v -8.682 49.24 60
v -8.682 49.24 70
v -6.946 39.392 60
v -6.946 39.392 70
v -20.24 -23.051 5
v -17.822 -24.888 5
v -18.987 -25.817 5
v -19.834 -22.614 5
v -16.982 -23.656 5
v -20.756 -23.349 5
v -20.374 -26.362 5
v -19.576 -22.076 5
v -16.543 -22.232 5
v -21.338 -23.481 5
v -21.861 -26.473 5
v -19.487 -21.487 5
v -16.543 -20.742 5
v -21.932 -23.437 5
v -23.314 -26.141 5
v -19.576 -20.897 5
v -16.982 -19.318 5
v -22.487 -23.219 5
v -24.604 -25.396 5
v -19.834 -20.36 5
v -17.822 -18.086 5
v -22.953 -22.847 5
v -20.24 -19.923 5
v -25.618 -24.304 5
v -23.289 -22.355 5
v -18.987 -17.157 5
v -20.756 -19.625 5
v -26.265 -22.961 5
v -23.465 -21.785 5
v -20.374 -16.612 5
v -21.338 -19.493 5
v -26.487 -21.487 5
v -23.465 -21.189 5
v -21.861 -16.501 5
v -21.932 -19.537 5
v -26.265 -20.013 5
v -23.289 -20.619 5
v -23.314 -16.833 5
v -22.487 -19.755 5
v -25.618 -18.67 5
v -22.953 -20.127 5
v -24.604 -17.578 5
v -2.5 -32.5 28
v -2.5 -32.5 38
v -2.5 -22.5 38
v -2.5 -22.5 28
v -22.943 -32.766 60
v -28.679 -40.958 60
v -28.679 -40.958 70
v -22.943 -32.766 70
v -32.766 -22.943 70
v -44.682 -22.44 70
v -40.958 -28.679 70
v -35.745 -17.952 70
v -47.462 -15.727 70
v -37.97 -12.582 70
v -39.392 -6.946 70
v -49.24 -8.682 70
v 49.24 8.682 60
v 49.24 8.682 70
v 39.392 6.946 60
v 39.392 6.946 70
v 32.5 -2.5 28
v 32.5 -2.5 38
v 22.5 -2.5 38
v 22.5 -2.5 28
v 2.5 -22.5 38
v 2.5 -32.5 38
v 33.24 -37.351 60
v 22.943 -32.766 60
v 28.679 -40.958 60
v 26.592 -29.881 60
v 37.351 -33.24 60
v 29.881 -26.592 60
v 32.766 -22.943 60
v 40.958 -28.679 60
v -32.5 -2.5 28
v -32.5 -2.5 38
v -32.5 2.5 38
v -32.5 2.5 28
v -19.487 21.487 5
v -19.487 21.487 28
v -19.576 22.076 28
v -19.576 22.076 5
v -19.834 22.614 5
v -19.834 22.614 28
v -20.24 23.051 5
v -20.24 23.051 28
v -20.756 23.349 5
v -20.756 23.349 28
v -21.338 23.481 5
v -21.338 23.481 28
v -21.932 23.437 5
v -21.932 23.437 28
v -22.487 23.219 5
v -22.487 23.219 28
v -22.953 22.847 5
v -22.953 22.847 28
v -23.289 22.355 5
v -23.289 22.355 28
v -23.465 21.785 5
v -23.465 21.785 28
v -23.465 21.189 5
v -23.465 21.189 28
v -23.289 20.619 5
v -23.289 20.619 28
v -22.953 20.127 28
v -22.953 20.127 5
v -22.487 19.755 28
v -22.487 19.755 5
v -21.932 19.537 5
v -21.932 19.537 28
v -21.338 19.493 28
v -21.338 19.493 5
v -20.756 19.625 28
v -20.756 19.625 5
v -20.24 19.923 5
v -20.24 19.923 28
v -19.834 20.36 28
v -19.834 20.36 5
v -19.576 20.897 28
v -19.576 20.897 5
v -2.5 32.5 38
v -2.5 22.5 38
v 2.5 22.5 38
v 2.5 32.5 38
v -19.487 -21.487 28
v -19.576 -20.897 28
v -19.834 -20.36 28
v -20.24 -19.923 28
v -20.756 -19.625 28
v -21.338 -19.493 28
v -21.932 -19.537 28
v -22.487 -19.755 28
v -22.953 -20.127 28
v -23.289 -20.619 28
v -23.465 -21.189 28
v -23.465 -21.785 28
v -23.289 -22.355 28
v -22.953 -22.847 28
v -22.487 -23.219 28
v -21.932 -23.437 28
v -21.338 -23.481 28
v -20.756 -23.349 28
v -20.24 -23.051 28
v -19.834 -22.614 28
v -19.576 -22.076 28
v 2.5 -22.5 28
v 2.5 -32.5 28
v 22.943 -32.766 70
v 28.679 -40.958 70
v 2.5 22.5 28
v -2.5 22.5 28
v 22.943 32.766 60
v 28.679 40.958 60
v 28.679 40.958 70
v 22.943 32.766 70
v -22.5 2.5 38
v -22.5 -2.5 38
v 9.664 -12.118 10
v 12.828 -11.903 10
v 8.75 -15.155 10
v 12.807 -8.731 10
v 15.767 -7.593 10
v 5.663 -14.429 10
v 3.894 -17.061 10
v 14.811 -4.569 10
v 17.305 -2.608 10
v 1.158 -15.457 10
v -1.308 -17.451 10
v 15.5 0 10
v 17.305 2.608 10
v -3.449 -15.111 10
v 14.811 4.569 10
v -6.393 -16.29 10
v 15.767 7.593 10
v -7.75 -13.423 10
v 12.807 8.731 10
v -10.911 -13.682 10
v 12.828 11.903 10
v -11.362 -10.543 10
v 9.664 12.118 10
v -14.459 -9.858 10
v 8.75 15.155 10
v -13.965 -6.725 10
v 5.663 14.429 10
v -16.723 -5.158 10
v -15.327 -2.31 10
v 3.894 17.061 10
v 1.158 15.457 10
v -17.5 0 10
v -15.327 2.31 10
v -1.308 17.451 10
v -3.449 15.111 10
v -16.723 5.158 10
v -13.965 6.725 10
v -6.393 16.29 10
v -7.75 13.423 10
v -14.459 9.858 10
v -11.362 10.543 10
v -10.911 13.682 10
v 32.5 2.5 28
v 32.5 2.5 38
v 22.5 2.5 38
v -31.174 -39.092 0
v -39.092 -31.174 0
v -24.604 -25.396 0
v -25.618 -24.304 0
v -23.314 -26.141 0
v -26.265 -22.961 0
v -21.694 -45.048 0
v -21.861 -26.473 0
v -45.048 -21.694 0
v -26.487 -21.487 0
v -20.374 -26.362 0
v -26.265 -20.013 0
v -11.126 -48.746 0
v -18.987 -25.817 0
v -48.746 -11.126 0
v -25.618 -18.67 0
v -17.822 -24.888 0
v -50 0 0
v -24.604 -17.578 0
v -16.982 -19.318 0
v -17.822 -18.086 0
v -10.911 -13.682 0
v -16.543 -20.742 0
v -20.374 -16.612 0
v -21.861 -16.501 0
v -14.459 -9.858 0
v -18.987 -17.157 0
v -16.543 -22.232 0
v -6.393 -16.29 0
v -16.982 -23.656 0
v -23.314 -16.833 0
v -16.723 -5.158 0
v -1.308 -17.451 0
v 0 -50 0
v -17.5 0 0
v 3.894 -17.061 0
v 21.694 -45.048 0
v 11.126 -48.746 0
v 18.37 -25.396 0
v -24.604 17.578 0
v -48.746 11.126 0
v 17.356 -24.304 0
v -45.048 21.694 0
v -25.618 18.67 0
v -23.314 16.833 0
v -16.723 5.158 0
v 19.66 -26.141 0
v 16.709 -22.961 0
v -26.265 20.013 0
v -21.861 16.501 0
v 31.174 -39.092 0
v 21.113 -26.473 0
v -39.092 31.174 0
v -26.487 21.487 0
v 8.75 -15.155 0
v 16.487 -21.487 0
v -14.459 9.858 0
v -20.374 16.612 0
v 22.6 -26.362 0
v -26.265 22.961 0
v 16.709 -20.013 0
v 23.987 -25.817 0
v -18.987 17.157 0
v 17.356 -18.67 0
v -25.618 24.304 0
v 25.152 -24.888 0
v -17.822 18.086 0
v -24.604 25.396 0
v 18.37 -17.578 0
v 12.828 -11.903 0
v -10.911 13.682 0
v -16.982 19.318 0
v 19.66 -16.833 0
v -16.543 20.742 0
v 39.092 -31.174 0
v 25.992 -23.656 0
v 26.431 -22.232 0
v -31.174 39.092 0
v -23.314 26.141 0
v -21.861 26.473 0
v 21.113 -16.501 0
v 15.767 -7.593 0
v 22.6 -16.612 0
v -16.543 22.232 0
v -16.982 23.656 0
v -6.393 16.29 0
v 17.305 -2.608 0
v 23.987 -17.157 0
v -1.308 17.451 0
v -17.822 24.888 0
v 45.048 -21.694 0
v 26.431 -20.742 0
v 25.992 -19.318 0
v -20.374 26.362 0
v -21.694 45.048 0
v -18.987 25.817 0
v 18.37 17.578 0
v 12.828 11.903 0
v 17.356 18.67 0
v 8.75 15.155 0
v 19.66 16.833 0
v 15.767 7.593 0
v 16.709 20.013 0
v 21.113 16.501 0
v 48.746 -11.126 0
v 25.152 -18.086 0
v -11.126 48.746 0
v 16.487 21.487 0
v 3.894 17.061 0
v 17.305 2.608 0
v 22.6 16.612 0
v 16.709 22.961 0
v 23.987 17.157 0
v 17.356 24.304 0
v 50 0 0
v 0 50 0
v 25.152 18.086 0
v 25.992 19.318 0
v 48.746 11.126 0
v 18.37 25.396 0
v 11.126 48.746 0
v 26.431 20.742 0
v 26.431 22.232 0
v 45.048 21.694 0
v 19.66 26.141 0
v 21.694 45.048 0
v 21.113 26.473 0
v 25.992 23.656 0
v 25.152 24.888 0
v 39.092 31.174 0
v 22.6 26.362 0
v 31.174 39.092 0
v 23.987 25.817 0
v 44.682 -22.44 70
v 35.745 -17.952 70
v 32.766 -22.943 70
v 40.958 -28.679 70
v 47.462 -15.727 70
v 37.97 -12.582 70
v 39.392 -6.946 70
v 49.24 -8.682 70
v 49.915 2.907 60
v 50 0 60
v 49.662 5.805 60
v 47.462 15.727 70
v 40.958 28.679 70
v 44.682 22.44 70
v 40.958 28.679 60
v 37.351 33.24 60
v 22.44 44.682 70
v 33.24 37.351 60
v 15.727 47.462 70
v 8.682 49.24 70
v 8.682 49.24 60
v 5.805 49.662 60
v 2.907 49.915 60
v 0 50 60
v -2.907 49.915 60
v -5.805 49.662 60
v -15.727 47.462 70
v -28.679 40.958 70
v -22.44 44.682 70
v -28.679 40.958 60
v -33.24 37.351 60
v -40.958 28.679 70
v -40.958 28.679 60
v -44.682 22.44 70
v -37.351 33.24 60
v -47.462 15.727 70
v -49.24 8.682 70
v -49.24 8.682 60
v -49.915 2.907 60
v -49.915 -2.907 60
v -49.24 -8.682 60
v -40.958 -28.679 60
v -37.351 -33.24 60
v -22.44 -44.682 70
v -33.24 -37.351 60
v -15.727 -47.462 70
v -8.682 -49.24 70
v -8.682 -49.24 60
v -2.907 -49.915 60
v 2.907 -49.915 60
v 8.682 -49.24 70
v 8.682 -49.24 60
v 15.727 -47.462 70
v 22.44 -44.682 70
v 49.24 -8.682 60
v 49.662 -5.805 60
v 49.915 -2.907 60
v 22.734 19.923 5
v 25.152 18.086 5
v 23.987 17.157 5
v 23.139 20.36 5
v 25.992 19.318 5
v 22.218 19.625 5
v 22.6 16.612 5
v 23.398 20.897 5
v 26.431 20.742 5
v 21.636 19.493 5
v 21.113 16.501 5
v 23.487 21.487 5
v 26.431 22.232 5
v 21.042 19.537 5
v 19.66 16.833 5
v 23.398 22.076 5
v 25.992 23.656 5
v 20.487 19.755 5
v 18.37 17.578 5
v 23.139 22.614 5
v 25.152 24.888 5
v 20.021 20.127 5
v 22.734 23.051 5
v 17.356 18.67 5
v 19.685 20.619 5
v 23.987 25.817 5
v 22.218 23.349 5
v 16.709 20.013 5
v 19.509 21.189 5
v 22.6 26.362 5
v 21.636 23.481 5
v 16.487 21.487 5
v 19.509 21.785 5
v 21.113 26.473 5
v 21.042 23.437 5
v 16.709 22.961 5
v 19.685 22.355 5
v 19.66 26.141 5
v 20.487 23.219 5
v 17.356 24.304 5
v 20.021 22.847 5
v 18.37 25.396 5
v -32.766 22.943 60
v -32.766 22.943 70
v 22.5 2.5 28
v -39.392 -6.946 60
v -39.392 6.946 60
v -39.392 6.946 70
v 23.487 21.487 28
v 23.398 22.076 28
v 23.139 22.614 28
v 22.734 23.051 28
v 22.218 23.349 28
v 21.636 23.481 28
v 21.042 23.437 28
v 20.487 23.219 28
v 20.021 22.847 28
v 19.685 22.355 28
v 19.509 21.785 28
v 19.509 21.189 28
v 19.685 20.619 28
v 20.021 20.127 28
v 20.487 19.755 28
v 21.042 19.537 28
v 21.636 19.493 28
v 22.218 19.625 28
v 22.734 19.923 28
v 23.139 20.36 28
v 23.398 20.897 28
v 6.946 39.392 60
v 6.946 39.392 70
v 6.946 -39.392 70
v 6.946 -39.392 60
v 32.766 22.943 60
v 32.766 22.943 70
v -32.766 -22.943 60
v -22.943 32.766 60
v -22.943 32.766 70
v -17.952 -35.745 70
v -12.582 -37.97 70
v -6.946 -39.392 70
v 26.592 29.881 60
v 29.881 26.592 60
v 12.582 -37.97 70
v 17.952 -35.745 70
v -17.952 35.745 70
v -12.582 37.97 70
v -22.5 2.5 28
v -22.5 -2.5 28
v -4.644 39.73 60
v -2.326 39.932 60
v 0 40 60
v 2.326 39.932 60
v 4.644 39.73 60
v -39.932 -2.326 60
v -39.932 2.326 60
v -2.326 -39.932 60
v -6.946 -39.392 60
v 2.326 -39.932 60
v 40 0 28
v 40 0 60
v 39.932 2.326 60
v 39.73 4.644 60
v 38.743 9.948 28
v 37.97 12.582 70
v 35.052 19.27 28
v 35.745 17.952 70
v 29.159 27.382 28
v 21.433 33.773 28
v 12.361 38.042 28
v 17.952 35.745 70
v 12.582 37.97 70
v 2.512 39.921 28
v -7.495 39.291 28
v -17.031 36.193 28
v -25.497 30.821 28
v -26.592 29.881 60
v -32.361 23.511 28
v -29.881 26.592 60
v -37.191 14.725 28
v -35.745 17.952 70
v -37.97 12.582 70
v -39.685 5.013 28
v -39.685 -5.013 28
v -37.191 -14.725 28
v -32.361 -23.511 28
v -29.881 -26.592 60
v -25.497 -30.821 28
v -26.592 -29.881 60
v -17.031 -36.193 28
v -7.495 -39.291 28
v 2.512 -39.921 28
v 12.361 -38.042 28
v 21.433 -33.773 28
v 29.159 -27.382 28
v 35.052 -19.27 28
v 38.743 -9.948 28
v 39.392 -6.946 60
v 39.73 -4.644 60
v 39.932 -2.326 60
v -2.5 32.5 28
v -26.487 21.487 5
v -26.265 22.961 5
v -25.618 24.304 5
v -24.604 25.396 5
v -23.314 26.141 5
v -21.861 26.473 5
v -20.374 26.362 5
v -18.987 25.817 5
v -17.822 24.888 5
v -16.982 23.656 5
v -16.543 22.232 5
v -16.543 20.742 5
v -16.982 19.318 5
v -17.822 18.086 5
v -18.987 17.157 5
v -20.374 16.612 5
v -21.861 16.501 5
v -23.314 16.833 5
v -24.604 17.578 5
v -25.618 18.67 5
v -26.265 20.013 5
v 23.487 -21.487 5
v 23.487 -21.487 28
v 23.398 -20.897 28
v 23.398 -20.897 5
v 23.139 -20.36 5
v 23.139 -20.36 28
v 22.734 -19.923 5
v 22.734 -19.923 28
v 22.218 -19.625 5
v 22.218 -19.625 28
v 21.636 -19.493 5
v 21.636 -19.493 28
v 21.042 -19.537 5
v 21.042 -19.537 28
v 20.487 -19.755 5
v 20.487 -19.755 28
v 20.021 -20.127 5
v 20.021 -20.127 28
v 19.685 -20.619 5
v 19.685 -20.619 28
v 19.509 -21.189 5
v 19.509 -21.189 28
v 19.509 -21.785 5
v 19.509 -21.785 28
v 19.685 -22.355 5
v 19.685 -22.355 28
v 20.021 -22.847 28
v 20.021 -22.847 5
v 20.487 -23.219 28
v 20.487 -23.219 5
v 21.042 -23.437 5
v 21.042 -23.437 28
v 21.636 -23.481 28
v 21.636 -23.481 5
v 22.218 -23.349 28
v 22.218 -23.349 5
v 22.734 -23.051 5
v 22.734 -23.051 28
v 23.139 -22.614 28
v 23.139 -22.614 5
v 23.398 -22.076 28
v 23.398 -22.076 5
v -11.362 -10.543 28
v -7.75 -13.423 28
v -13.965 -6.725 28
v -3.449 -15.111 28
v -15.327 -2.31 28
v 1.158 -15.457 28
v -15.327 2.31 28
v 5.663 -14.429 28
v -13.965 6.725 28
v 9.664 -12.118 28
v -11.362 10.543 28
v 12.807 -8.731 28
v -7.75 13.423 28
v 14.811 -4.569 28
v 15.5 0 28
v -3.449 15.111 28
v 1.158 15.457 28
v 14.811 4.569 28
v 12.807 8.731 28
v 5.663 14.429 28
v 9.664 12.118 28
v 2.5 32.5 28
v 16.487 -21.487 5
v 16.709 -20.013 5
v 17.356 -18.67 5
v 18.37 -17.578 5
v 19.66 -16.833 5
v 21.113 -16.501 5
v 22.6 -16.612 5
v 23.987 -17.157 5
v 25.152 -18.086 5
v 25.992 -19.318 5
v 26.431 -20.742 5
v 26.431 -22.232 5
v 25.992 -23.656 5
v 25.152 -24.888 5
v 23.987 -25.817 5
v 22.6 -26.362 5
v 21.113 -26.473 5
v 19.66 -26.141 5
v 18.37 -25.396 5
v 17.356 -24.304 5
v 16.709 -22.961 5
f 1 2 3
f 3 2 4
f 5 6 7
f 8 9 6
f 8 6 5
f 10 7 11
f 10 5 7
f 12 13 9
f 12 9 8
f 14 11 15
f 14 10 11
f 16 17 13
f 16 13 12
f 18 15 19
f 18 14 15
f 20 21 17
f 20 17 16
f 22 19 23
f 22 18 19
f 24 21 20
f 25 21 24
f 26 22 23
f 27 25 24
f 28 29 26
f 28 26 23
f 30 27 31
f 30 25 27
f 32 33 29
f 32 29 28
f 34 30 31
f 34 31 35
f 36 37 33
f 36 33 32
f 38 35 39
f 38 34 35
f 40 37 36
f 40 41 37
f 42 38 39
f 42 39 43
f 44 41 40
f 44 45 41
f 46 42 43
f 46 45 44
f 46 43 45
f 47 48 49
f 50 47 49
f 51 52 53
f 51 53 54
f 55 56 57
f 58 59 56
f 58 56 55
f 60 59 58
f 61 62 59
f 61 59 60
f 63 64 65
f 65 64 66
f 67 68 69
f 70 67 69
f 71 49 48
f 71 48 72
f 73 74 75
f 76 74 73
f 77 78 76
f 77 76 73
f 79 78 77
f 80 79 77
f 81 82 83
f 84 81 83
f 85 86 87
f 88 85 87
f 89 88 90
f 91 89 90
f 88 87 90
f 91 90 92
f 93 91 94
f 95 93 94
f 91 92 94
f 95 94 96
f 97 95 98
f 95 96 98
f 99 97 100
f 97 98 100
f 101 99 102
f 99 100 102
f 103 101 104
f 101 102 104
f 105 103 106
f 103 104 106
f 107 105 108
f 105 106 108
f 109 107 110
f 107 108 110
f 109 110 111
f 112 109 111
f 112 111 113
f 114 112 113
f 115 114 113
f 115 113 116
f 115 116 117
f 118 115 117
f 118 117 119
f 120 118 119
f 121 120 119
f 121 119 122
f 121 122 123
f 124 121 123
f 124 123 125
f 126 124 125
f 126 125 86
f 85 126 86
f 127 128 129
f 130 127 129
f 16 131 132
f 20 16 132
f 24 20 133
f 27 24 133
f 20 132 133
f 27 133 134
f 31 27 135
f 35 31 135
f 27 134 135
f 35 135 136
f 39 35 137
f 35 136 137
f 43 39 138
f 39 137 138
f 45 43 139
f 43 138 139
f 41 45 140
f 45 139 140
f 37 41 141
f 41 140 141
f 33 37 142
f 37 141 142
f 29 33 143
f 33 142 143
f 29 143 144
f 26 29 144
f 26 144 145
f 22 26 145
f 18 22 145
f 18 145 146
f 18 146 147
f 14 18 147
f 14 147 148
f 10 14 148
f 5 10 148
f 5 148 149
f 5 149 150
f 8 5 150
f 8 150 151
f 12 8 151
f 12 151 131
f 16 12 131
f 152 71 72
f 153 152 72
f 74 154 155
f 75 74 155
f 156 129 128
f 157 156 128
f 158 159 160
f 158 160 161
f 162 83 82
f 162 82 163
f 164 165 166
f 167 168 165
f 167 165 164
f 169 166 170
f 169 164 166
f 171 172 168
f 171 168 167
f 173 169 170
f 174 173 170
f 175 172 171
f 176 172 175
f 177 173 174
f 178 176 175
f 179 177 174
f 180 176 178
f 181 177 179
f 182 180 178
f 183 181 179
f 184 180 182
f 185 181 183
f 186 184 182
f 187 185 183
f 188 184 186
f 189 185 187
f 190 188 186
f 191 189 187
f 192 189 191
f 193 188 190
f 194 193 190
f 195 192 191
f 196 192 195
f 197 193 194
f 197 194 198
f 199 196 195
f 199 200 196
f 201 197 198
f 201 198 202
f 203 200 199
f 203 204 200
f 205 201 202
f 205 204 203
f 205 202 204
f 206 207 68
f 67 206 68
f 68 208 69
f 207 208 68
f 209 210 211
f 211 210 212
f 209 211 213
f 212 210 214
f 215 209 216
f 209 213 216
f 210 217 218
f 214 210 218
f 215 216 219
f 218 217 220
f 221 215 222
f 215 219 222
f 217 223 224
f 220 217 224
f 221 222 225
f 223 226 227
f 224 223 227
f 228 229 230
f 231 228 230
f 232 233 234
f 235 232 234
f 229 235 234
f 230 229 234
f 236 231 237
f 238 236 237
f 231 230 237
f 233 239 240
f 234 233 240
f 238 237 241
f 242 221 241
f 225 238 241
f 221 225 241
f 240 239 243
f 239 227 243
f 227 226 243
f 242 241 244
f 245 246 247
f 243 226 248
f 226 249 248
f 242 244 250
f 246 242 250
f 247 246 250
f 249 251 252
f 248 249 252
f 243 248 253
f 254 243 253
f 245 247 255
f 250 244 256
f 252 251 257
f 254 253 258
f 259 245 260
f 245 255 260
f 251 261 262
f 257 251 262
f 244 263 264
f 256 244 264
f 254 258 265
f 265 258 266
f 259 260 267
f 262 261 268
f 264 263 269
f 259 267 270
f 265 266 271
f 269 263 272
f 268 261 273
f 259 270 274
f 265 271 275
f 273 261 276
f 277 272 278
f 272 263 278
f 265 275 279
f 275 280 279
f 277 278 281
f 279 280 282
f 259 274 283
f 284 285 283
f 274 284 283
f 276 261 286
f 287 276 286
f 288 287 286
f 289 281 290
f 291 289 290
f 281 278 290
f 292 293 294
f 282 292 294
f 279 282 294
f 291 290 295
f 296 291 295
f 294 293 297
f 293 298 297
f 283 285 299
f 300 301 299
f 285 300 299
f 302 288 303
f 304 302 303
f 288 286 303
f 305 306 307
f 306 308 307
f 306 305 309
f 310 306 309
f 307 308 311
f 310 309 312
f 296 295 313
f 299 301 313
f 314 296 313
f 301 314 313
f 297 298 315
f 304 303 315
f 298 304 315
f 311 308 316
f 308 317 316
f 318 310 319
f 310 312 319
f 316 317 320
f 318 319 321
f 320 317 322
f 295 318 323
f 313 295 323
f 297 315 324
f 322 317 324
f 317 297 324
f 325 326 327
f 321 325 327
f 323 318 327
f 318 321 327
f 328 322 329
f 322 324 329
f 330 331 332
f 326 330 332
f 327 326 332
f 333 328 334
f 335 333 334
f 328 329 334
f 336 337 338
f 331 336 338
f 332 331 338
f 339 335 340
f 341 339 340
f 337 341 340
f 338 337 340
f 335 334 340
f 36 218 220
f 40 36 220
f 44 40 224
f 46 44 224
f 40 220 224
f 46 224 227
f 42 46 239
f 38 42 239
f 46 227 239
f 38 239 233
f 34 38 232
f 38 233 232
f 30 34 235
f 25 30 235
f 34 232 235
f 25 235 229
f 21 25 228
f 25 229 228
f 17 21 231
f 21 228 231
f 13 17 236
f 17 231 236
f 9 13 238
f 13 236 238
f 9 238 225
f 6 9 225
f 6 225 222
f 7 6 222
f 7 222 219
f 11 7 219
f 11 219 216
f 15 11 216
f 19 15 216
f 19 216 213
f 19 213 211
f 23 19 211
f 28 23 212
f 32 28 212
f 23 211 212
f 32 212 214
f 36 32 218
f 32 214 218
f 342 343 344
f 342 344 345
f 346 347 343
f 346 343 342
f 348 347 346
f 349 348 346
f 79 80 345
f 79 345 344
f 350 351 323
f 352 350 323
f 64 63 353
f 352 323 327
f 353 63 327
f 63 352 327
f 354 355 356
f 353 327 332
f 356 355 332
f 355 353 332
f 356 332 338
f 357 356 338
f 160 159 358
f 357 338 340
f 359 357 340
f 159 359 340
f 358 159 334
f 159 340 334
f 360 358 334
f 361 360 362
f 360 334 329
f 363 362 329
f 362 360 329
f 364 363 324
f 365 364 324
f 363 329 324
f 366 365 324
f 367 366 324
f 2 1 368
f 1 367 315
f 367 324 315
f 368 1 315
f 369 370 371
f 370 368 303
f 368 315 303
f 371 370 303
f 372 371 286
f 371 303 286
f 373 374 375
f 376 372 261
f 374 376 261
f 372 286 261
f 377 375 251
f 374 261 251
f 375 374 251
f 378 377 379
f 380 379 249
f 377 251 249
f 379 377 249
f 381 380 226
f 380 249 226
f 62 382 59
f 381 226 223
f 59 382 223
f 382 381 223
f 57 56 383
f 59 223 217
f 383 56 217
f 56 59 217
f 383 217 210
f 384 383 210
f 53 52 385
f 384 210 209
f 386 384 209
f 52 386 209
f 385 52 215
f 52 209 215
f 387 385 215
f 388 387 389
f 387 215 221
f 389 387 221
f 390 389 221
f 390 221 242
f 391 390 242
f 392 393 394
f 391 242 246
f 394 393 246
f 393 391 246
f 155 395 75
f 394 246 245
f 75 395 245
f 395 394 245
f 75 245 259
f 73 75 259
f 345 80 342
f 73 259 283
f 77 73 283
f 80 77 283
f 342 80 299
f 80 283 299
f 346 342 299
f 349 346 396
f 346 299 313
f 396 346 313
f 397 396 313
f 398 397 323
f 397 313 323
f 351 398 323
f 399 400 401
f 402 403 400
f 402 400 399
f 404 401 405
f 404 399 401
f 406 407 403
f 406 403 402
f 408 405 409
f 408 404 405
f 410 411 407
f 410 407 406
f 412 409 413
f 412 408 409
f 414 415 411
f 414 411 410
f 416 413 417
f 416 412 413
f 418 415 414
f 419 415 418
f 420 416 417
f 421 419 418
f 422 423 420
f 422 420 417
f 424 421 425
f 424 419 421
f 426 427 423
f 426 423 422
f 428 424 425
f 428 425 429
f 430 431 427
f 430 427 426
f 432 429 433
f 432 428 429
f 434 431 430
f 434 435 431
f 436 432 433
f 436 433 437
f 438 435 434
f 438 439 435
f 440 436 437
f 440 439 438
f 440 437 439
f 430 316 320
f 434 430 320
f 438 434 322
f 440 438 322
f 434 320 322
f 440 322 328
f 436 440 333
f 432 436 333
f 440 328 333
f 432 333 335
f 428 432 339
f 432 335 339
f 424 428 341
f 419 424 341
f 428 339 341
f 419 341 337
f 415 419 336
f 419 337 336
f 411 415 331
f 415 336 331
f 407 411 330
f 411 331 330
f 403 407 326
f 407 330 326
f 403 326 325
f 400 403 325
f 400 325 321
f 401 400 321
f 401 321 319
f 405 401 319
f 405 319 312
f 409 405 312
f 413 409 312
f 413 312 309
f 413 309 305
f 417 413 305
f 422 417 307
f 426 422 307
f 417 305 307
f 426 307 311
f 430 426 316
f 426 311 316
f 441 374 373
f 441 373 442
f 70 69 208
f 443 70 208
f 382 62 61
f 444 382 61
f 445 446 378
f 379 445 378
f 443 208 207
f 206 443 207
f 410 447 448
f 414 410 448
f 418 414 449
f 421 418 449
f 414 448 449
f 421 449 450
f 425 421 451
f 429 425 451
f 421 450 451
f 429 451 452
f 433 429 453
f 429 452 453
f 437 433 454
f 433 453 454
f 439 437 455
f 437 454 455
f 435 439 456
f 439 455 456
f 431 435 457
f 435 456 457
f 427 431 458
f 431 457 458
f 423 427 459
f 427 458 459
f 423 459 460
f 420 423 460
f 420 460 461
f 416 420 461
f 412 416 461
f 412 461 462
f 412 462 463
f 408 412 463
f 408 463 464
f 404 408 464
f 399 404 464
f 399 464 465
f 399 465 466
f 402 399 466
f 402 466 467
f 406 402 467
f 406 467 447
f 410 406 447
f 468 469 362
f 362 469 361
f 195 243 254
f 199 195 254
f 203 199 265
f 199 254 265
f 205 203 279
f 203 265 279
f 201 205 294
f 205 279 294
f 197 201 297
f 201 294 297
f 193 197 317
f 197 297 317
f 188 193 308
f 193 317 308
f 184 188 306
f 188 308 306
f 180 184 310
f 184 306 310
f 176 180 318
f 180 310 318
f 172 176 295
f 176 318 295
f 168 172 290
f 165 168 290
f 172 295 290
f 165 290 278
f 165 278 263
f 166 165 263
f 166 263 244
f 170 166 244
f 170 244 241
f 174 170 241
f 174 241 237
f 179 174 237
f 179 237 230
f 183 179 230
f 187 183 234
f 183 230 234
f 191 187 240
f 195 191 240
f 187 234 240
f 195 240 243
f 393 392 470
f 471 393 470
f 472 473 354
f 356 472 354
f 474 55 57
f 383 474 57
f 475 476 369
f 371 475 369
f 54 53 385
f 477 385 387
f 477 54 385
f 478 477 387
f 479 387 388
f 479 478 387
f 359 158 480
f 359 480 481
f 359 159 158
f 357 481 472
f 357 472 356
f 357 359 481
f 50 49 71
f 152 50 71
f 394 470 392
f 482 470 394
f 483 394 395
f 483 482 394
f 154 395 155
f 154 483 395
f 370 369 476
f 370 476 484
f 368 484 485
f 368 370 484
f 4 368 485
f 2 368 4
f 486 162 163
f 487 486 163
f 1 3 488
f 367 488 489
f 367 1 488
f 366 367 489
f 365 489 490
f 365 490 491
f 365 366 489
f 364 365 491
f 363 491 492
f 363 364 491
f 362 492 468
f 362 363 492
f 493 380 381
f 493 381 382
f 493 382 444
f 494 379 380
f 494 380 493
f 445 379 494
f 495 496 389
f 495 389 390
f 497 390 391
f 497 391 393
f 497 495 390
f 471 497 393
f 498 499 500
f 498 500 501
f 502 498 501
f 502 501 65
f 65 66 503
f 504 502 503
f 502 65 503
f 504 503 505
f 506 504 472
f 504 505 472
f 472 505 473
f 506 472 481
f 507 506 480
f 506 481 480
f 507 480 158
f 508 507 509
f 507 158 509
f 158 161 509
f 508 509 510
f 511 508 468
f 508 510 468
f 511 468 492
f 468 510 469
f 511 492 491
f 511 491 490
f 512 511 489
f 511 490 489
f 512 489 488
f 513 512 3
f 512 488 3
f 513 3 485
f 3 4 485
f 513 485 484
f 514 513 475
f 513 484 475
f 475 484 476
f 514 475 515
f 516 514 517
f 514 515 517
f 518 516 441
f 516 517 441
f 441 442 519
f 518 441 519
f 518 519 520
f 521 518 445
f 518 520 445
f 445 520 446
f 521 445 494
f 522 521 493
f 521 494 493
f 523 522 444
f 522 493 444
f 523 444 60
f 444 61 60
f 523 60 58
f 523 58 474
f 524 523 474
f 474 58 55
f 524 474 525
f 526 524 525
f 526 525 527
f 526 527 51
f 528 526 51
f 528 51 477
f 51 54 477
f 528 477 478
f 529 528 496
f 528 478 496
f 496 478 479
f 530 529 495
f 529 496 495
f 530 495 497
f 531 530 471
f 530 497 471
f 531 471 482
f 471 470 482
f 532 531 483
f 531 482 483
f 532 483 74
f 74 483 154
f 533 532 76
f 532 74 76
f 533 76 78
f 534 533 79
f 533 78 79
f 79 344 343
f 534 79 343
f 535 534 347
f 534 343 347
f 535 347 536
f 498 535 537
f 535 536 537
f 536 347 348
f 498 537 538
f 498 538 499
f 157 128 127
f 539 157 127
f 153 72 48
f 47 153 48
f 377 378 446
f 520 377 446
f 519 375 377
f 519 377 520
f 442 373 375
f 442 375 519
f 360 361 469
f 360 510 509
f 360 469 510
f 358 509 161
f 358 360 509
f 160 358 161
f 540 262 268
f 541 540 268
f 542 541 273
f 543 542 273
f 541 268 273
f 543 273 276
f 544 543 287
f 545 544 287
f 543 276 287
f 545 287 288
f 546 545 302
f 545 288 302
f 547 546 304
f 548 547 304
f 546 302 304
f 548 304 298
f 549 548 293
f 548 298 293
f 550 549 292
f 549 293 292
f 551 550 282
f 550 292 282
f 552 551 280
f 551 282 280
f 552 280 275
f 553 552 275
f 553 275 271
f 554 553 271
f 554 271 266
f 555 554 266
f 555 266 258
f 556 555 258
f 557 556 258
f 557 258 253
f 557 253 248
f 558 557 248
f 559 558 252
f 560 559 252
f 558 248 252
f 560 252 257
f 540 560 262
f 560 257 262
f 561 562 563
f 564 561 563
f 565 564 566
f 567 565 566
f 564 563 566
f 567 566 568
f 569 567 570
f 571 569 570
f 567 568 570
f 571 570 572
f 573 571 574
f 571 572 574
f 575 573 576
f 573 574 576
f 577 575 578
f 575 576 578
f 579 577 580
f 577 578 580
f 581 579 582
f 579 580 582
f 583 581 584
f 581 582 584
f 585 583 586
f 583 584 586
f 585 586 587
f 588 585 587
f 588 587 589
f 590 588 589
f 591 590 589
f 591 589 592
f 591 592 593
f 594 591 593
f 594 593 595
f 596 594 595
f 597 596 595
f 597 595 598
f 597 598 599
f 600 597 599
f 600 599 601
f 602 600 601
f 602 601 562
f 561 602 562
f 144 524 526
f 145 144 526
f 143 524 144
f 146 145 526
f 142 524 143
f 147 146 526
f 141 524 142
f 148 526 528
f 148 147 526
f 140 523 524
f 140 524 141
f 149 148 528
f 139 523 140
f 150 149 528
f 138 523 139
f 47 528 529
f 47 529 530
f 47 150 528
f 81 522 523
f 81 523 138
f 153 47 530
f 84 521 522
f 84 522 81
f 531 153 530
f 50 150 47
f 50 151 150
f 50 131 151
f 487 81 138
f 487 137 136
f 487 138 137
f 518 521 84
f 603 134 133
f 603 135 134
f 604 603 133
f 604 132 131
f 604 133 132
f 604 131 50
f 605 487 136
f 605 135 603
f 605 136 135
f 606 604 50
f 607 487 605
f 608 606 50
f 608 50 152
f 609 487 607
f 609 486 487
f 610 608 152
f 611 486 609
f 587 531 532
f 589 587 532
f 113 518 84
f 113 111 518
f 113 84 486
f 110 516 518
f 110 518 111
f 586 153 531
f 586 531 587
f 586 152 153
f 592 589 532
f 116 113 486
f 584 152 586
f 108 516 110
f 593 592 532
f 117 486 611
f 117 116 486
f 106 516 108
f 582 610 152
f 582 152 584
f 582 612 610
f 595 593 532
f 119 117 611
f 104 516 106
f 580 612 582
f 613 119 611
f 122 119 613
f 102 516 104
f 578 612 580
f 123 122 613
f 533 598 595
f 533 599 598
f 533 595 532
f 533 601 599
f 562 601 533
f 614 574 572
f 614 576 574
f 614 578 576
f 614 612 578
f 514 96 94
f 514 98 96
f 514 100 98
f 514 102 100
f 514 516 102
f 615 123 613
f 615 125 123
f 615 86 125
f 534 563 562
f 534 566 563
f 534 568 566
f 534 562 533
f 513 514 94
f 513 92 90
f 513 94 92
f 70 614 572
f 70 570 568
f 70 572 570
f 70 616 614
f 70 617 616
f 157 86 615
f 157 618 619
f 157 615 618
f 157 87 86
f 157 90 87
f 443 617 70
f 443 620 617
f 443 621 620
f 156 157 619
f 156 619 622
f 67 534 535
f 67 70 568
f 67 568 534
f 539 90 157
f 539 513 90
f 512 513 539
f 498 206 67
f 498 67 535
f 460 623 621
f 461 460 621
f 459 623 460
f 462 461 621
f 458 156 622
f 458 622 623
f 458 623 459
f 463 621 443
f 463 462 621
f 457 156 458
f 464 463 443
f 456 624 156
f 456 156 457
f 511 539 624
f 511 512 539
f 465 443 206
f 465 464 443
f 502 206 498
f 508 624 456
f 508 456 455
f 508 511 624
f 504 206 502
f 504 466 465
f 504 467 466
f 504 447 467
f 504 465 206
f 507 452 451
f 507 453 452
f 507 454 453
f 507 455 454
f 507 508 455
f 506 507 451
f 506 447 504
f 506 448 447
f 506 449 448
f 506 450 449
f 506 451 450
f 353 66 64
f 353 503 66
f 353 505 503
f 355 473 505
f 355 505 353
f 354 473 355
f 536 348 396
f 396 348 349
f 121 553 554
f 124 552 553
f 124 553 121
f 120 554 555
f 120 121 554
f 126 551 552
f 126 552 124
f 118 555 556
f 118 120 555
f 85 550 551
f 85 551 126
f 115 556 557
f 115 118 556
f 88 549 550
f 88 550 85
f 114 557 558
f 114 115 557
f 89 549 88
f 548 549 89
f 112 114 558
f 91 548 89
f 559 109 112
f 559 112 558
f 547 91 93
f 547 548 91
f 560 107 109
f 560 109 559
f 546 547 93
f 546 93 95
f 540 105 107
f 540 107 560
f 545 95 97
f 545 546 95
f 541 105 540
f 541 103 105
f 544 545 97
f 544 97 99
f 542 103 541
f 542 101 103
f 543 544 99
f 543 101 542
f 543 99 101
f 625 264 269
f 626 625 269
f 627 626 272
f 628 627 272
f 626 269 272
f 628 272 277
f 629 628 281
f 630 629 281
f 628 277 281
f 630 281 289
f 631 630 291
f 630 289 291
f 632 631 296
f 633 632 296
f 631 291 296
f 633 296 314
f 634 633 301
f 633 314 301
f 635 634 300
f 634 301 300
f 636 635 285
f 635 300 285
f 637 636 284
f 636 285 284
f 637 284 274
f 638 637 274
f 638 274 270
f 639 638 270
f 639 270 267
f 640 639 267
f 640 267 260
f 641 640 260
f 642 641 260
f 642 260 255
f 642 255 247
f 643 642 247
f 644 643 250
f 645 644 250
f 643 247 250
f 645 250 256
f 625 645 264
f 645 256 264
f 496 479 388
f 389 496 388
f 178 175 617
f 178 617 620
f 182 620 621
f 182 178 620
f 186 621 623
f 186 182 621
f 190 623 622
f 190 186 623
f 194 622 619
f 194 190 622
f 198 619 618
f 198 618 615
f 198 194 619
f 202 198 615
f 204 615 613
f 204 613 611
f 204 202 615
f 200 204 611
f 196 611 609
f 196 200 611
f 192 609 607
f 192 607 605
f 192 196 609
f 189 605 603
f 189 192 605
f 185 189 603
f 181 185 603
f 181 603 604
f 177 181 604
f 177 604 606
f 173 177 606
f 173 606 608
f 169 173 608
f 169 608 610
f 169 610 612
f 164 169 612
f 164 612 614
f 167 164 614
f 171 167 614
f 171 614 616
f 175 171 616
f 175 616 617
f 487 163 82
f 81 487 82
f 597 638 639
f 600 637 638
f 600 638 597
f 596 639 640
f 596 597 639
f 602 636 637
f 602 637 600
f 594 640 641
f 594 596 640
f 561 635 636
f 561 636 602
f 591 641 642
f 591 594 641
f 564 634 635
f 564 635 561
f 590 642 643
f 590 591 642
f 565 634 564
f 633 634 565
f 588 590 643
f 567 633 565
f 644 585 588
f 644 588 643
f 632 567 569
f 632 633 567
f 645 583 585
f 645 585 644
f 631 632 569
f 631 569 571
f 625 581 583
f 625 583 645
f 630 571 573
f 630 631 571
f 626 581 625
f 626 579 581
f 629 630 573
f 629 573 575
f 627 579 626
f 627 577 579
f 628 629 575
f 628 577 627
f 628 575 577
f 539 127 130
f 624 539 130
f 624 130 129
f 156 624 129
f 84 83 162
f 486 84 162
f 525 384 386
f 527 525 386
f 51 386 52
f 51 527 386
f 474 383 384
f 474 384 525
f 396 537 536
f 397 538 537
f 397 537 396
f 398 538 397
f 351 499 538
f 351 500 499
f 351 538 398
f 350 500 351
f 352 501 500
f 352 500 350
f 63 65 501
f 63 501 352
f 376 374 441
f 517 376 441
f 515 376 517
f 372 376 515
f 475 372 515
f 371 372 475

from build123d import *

# Parameters (mm, degrees)
CROQUIS1_R              = 50
CROQUIS1_R_2            = 15.5
SALIENTE_EXTRUIR1_DEPTH = 70
CROQUIS2_R              = 40
CORTAR_EXTRUIR1_DEPTH   = 32
CROQUIS3_R              = 17.5
CORTAR_EXTRUIR2_DEPTH   = 10
CROQUIS4_R              = 40
CROQUIS4_R_2            = 15.5
CORTAR_EXTRUIR3_DEPTH   = 10
CROQUIS5_R              = 2
CORTAR_EXTRUIR4_DEPTH   = 83.24354078
CROQUIS6_R              = 5
CORTAR_EXTRUIR5_DEPTH   = 5
CORTAR_EXTRUIR6_DEPTH   = 10


with BuildPart() as part:
    # Croquis1 → Saliente-Extruir1 (new body)
    with BuildSketch(Plane.XY):
        Circle(CROQUIS1_R)
        Circle(CROQUIS1_R_2, mode=Mode.SUBTRACT)
    extrude(amount=SALIENTE_EXTRUIR1_DEPTH)

    # Croquis2 → Cortar-Extruir1 (cut)
    with BuildSketch(Plane.XY.offset(70)):
        Circle(CROQUIS2_R)
    extrude(amount=-CORTAR_EXTRUIR1_DEPTH, mode=Mode.SUBTRACT)

    # Croquis3 → Cortar-Extruir2 (cut)
    with BuildSketch(Plane(origin=(0, 0, 0), x_dir=(-1, 0, 0), z_dir=(0, 0, -1))):
        Circle(CROQUIS3_R)
    extrude(amount=-CORTAR_EXTRUIR2_DEPTH, mode=Mode.SUBTRACT)

    # Croquis4 → Cortar-Extruir3 (cut)
    # profile 1 of 2: a face of its own
    with BuildSketch(Plane.XY.offset(38)):
        Circle(CROQUIS4_R)
        with BuildLine():
            Line((-2.5, 27.386127875), (-2.5, 32.5))
            Line((-2.5, 32.5), (2.5, 32.5))
            Line((2.5, 32.5), (2.5, 27.386127875))
            ThreePointArc((2.5, 27.386127875), (19.445436483, 19.445436483), (27.386127875, 2.5))
            Line((27.386127875, 2.5), (32.5, 2.5))
            Line((32.5, 2.5), (32.5, -2.5))
            Line((32.5, -2.5), (27.386127875, -2.5))
            ThreePointArc((27.386127875, -2.5), (19.445436483, -19.445436483), (2.5, -27.386127875))
            Line((2.5, -27.386127875), (2.5, -32.5))
            Line((2.5, -32.5), (-2.5, -32.5))
            Line((-2.5, -32.5), (-2.5, -27.386127875))
            ThreePointArc((-2.5, -27.386127875), (-19.445436483, -19.445436483), (-27.386127875, -2.5))
            Line((-27.386127875, -2.5), (-32.5, -2.5))
            Line((-32.5, -2.5), (-32.5, 2.5))
            Line((-32.5, 2.5), (-27.386127875, 2.5))
            ThreePointArc((-27.386127875, 2.5), (-19.445436483, 19.445436483), (-2.5, 27.386127875))
        make_face(mode=Mode.SUBTRACT)
    # profile 2 of 2: a face of its own
    with BuildSketch(Plane.XY.offset(38)):
        with BuildLine():
            Line((-2.5, 22.5), (-2.5, 27.386127875))
            ThreePointArc((-2.5, 27.386127875), (-19.445436483, 19.445436483), (-27.386127875, 2.5))
            Line((-27.386127875, 2.5), (-22.5, 2.5))
            Line((-22.5, 2.5), (-22.5, -2.5))
            Line((-22.5, -2.5), (-27.386127875, -2.5))
            ThreePointArc((-27.386127875, -2.5), (-19.445436483, -19.445436483), (-2.5, -27.386127875))
            Line((-2.5, -27.386127875), (-2.5, -22.5))
            Line((-2.5, -22.5), (2.5, -22.5))
            Line((2.5, -22.5), (2.5, -27.386127875))
            ThreePointArc((2.5, -27.386127875), (19.445436483, -19.445436483), (27.386127875, -2.5))
            Line((27.386127875, -2.5), (22.5, -2.5))
            Line((22.5, -2.5), (22.5, 2.5))
            Line((22.5, 2.5), (27.386127875, 2.5))
            ThreePointArc((27.386127875, 2.5), (19.445436483, 19.445436483), (2.5, 27.386127875))
            Line((2.5, 27.386127875), (2.5, 22.5))
            Line((2.5, 22.5), (-2.5, 22.5))
        make_face()
        with Locations(Location((0, 0, 0), (0, 0, 180))):
            Circle(CROQUIS4_R_2, mode=Mode.SUBTRACT)
    extrude(amount=-CORTAR_EXTRUIR3_DEPTH, mode=Mode.SUBTRACT)

    # Croquis5 → Cortar-Extruir4 (cut, through all)
    with BuildSketch(Plane.XY.offset(28)):
        with Locations((21.486974797, 21.486974797)):
            Circle(CROQUIS5_R)
        with Locations((21.486974797, -21.486974797)):
            Circle(CROQUIS5_R)
        with Locations((-21.486974797, -21.486974797)):
            Circle(CROQUIS5_R)
        with Locations((-21.486974797, 21.486974797)):
            Circle(CROQUIS5_R)
    extrude(amount=-CORTAR_EXTRUIR4_DEPTH, mode=Mode.SUBTRACT)

    # Croquis6 → Cortar-Extruir5 (cut)
    with BuildSketch(Plane(origin=(0, 0, 0), x_dir=(-1, 0, 0), z_dir=(0, 0, -1))):
        with Locations((-21.486974797, 21.486974797)):
            Circle(CROQUIS6_R)
        with Locations((21.486974797, 21.486974797)):
            Circle(CROQUIS6_R)
        with Locations((21.486974797, -21.486974797)):
            Circle(CROQUIS6_R)
        with Locations((-21.486974797, -21.486974797)):
            Circle(CROQUIS6_R)
    extrude(amount=-CORTAR_EXTRUIR5_DEPTH, mode=Mode.SUBTRACT)

    # Croquis7 → Cortar-Extruir6 (cut)
    with BuildSketch(Plane.XY.offset(70)):
        with BuildLine():
            ThreePointArc((-6.945927107, 39.39231012), (-3.48622971, 39.847787924), (0, 40))
            Line((0, 40), (0, 50))
            ThreePointArc((0, 50), (-4.357787137, 49.809734905), (-8.682408883, 49.240387651))
            Line((-8.682408883, 49.240387651), (-6.945927107, 39.39231012))
        make_face()
        with BuildLine():
            Line((0, 50), (0, 40))
            ThreePointArc((0, 40), (3.48622971, 39.847787924), (6.945927107, 39.39231012))
            Line((6.945927107, 39.39231012), (8.682408883, 49.240387651))
            ThreePointArc((8.682408883, 49.240387651), (4.357787137, 49.809734905), (0, 50))
        make_face()
        with BuildLine():
            ThreePointArc((22.943057454, 32.766081772), (28.284271247, 28.284271247), (32.766081772, 22.943057454))
            Line((32.766081772, 22.943057454), (40.957602214, 28.678821818))
            ThreePointArc((40.957602214, 28.678821818), (35.355339059, 35.355339059), (28.678821818, 40.957602214))
            Line((28.678821818, 40.957602214), (22.943057454, 32.766081772))
        make_face()
        with BuildLine():
            ThreePointArc((40, 0), (39.847787924, -3.48622971), (39.39231012, -6.945927107))
            Line((39.39231012, -6.945927107), (49.240387651, -8.682408883))
            ThreePointArc((49.240387651, -8.682408883), (49.809734905, -4.357787137), (50, 0))
            ThreePointArc((50, 0), (49.809734905, 4.357787137), (49.240387651, 8.682408883))
            Line((49.240387651, 8.682408883), (39.39231012, 6.945927107))
            ThreePointArc((39.39231012, 6.945927107), (39.847787924, 3.48622971), (40, 0))
        make_face()
        with BuildLine():
            ThreePointArc((32.766081772, -22.943057454), (28.284271247, -28.284271247), (22.943057454, -32.766081772))
            Line((22.943057454, -32.766081772), (28.678821818, -40.957602214))
            ThreePointArc((28.678821818, -40.957602214), (35.355339059, -35.355339059), (40.957602214, -28.678821818))
            Line((40.957602214, -28.678821818), (32.766081772, -22.943057454))
        make_face()
        with BuildLine():
            ThreePointArc((-32.766081772, 22.943057454), (-28.284271247, 28.284271247), (-22.943057454, 32.766081772))
            Line((-22.943057454, 32.766081772), (-28.678821818, 40.957602214))
            ThreePointArc((-28.678821818, 40.957602214), (-35.355339059, 35.355339059), (-40.957602214, 28.678821818))
            Line((-40.957602214, 28.678821818), (-32.766081772, 22.943057454))
        make_face()
        with BuildLine():
            ThreePointArc((-39.39231012, -6.945927107), (-40, 0), (-39.39231012, 6.945927107))
            Line((-39.39231012, 6.945927107), (-49.240387651, 8.682408883))
            ThreePointArc((-49.240387651, 8.682408883), (-50, 0), (-49.240387651, -8.682408883))
            Line((-49.240387651, -8.682408883), (-39.39231012, -6.945927107))
        make_face()
        with BuildLine():
            ThreePointArc((-22.943057454, -32.766081772), (-28.284271247, -28.284271247), (-32.766081772, -22.943057454))
            Line((-32.766081772, -22.943057454), (-40.957602214, -28.678821818))
            ThreePointArc((-40.957602214, -28.678821818), (-35.355339059, -35.355339059), (-28.678821818, -40.957602214))
            Line((-28.678821818, -40.957602214), (-22.943057454, -32.766081772))
        make_face()
        with BuildLine():
            ThreePointArc((6.945927107, -39.39231012), (0, -40), (-6.945927107, -39.39231012))
            Line((-6.945927107, -39.39231012), (-8.682408883, -49.240387651))
            ThreePointArc((-8.682408883, -49.240387651), (0, -50), (8.682408883, -49.240387651))
            Line((8.682408883, -49.240387651), (6.945927107, -39.39231012))
        make_face()
    extrude(amount=-CORTAR_EXTRUIR6_DEPTH, mode=Mode.SUBTRACT)


solid = part.part
